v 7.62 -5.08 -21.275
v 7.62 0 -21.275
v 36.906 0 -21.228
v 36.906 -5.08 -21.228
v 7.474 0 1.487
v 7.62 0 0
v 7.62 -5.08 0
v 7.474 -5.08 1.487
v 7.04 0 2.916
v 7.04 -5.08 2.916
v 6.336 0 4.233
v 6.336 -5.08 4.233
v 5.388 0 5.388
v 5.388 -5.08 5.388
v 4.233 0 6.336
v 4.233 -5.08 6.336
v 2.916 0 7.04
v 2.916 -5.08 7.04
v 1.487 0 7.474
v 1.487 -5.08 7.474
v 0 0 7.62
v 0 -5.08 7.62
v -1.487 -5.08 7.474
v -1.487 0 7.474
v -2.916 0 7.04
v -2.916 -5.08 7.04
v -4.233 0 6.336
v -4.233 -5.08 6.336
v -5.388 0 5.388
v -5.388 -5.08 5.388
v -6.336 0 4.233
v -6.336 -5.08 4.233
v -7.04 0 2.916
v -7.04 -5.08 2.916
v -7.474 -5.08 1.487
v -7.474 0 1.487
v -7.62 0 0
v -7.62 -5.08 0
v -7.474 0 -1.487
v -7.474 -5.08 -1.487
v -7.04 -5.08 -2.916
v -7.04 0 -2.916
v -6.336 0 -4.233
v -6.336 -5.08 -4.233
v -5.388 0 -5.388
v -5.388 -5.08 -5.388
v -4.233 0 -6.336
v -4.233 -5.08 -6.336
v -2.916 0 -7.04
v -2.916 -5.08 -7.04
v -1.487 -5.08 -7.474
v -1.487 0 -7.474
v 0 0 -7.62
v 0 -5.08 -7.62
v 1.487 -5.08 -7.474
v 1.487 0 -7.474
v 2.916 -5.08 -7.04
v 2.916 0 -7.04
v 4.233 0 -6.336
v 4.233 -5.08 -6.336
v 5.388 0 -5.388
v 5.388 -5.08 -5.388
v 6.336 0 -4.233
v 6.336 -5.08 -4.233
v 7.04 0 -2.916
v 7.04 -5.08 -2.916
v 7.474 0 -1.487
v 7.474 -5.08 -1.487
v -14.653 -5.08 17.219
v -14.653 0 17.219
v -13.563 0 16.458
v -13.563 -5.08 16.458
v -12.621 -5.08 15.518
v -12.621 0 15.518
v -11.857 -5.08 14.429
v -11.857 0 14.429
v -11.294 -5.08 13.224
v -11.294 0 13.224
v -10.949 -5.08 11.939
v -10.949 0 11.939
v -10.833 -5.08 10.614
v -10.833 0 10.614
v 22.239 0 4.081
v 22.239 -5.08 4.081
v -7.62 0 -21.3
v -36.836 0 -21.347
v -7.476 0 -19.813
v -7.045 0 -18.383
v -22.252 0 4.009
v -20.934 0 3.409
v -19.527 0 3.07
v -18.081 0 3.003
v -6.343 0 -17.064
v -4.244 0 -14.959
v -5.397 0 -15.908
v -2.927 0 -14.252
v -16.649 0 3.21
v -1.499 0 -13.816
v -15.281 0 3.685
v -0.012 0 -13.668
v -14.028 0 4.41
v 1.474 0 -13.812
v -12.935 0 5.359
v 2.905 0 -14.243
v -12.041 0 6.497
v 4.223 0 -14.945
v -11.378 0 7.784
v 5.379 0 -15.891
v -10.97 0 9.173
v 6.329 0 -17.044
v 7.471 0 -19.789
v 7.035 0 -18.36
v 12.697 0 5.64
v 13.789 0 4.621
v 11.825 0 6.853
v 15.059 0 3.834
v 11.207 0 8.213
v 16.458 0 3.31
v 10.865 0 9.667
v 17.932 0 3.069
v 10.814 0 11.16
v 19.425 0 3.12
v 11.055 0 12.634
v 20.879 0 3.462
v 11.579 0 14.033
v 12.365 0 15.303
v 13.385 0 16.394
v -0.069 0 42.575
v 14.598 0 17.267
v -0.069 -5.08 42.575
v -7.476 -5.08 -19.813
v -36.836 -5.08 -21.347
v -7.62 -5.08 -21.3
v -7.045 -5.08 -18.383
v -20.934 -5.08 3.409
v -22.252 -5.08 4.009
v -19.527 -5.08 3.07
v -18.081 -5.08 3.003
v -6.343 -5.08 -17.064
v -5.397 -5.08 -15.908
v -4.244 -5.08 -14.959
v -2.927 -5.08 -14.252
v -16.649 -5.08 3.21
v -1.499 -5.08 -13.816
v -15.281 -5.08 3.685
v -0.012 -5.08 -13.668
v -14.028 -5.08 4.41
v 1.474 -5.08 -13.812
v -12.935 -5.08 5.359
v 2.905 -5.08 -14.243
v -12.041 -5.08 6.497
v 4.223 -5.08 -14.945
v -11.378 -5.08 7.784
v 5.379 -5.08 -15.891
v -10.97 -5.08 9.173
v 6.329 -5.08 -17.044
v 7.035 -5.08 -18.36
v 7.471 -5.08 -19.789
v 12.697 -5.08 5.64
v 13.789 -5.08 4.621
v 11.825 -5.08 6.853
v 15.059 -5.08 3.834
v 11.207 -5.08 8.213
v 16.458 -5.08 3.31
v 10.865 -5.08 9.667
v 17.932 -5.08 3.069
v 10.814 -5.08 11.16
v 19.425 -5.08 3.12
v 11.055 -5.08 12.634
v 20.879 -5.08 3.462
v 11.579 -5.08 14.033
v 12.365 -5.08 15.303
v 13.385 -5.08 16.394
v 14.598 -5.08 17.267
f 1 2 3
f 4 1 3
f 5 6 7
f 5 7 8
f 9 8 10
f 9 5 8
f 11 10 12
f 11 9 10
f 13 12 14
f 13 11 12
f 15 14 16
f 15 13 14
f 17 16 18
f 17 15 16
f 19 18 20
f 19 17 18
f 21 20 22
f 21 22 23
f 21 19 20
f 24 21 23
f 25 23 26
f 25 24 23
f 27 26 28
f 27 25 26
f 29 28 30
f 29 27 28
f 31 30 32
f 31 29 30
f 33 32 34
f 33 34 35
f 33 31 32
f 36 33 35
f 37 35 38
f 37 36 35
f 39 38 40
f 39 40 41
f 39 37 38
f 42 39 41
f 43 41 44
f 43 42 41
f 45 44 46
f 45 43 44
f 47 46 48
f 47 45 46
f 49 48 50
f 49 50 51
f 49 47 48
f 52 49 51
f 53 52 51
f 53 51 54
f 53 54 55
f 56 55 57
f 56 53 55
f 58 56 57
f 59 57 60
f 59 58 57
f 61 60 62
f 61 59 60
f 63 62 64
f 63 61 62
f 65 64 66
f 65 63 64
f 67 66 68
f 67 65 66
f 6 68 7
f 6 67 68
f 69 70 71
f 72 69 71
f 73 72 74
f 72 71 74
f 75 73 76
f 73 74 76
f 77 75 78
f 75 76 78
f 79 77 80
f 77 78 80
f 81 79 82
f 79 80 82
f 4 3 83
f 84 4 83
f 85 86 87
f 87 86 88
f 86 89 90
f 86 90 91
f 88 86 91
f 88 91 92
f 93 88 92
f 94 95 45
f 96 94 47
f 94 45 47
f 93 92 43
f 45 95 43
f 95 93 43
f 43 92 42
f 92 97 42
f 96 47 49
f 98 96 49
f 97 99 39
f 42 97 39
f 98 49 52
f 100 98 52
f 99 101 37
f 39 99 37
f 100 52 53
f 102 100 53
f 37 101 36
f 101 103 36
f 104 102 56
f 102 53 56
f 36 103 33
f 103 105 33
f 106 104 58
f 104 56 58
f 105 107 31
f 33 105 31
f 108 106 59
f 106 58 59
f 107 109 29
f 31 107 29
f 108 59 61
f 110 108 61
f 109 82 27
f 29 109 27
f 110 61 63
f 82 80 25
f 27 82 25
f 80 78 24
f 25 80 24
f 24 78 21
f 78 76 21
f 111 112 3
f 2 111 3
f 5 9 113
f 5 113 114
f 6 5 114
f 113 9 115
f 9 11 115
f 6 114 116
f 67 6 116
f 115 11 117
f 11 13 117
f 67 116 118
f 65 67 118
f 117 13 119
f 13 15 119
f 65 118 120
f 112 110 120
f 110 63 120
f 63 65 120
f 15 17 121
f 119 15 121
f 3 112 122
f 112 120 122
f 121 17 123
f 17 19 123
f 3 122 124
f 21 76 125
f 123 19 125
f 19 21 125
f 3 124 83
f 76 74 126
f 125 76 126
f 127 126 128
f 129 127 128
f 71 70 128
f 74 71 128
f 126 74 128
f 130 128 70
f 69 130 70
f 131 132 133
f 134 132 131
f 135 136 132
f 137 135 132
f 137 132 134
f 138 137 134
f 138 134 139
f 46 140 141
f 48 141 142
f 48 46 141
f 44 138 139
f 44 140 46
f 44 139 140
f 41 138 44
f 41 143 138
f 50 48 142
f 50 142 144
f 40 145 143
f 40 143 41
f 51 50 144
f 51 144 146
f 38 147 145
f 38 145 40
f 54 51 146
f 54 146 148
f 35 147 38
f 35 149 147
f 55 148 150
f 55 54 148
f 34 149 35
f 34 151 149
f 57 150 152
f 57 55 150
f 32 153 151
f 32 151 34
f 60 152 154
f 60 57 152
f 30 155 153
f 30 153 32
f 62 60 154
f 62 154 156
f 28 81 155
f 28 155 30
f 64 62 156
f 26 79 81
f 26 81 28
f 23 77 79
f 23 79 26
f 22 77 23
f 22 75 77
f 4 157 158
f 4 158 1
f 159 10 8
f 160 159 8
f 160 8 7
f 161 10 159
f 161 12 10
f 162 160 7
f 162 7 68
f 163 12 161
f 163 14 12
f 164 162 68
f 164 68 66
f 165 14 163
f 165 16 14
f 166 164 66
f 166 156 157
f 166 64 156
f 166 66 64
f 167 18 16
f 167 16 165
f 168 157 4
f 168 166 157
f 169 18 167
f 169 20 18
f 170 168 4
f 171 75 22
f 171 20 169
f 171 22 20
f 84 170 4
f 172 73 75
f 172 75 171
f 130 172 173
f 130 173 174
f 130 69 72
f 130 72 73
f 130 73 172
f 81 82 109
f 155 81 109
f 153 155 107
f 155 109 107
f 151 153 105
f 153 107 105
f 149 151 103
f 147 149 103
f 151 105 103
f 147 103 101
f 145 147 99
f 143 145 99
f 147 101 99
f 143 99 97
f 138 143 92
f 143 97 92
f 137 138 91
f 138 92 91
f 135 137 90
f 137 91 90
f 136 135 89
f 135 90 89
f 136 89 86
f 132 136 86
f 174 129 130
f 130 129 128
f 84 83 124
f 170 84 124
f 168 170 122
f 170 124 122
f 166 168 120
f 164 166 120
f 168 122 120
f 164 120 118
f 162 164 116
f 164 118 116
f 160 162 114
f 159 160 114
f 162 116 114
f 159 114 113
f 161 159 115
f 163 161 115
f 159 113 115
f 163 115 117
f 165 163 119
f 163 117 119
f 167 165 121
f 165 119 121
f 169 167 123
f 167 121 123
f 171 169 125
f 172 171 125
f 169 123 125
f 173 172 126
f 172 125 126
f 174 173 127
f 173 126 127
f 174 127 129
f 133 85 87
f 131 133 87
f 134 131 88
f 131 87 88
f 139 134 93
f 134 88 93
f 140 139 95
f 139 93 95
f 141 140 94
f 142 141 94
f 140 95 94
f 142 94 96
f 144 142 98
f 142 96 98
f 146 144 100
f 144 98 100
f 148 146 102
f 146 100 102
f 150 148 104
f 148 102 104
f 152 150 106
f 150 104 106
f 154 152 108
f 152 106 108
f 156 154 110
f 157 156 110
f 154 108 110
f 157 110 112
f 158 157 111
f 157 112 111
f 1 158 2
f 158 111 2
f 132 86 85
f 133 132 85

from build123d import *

# Parameters (mm, degrees)
F0_R     = 7.62
F1_DEPTH = 5.08


with BuildPart() as f1:
    # F0 (on Front) → F1 (new body)
    with BuildSketch(Plane.XZ):
        with BuildLine():
            Line((7.61999, -21.275166), (36.905502, -21.227668))
            Line((36.905502, -21.227668), (22.238923, 4.080709))
            ThreePointArc((22.238923, 4.080709), (11.8253, 6.852936), (14.597528, 17.26656))
            Line((14.597528, 17.26656), (-0.069051, 42.574937))
            Line((-0.069051, 42.574937), (-14.653459, 17.219118))
            ThreePointArc((-14.653459, 17.219118), (-11.856729, 14.429184), (-10.832751, 10.613834))
            ThreePointArc((-10.832751, 10.613834), (-14.637401, 4.017812), (-22.252043, 4.00855))
            Line((-22.252043, 4.00855), (-36.836451, -21.347268))
            Line((-36.836451, -21.347268), (-7.61999, -21.299883))
            ThreePointArc((-7.61999, -21.299883), (-0.012359, -13.667534), (7.61999, -21.275166))
        make_face()
        Circle(F0_R, mode=Mode.SUBTRACT)
    extrude(amount=F1_DEPTH)


solid = f1.part
